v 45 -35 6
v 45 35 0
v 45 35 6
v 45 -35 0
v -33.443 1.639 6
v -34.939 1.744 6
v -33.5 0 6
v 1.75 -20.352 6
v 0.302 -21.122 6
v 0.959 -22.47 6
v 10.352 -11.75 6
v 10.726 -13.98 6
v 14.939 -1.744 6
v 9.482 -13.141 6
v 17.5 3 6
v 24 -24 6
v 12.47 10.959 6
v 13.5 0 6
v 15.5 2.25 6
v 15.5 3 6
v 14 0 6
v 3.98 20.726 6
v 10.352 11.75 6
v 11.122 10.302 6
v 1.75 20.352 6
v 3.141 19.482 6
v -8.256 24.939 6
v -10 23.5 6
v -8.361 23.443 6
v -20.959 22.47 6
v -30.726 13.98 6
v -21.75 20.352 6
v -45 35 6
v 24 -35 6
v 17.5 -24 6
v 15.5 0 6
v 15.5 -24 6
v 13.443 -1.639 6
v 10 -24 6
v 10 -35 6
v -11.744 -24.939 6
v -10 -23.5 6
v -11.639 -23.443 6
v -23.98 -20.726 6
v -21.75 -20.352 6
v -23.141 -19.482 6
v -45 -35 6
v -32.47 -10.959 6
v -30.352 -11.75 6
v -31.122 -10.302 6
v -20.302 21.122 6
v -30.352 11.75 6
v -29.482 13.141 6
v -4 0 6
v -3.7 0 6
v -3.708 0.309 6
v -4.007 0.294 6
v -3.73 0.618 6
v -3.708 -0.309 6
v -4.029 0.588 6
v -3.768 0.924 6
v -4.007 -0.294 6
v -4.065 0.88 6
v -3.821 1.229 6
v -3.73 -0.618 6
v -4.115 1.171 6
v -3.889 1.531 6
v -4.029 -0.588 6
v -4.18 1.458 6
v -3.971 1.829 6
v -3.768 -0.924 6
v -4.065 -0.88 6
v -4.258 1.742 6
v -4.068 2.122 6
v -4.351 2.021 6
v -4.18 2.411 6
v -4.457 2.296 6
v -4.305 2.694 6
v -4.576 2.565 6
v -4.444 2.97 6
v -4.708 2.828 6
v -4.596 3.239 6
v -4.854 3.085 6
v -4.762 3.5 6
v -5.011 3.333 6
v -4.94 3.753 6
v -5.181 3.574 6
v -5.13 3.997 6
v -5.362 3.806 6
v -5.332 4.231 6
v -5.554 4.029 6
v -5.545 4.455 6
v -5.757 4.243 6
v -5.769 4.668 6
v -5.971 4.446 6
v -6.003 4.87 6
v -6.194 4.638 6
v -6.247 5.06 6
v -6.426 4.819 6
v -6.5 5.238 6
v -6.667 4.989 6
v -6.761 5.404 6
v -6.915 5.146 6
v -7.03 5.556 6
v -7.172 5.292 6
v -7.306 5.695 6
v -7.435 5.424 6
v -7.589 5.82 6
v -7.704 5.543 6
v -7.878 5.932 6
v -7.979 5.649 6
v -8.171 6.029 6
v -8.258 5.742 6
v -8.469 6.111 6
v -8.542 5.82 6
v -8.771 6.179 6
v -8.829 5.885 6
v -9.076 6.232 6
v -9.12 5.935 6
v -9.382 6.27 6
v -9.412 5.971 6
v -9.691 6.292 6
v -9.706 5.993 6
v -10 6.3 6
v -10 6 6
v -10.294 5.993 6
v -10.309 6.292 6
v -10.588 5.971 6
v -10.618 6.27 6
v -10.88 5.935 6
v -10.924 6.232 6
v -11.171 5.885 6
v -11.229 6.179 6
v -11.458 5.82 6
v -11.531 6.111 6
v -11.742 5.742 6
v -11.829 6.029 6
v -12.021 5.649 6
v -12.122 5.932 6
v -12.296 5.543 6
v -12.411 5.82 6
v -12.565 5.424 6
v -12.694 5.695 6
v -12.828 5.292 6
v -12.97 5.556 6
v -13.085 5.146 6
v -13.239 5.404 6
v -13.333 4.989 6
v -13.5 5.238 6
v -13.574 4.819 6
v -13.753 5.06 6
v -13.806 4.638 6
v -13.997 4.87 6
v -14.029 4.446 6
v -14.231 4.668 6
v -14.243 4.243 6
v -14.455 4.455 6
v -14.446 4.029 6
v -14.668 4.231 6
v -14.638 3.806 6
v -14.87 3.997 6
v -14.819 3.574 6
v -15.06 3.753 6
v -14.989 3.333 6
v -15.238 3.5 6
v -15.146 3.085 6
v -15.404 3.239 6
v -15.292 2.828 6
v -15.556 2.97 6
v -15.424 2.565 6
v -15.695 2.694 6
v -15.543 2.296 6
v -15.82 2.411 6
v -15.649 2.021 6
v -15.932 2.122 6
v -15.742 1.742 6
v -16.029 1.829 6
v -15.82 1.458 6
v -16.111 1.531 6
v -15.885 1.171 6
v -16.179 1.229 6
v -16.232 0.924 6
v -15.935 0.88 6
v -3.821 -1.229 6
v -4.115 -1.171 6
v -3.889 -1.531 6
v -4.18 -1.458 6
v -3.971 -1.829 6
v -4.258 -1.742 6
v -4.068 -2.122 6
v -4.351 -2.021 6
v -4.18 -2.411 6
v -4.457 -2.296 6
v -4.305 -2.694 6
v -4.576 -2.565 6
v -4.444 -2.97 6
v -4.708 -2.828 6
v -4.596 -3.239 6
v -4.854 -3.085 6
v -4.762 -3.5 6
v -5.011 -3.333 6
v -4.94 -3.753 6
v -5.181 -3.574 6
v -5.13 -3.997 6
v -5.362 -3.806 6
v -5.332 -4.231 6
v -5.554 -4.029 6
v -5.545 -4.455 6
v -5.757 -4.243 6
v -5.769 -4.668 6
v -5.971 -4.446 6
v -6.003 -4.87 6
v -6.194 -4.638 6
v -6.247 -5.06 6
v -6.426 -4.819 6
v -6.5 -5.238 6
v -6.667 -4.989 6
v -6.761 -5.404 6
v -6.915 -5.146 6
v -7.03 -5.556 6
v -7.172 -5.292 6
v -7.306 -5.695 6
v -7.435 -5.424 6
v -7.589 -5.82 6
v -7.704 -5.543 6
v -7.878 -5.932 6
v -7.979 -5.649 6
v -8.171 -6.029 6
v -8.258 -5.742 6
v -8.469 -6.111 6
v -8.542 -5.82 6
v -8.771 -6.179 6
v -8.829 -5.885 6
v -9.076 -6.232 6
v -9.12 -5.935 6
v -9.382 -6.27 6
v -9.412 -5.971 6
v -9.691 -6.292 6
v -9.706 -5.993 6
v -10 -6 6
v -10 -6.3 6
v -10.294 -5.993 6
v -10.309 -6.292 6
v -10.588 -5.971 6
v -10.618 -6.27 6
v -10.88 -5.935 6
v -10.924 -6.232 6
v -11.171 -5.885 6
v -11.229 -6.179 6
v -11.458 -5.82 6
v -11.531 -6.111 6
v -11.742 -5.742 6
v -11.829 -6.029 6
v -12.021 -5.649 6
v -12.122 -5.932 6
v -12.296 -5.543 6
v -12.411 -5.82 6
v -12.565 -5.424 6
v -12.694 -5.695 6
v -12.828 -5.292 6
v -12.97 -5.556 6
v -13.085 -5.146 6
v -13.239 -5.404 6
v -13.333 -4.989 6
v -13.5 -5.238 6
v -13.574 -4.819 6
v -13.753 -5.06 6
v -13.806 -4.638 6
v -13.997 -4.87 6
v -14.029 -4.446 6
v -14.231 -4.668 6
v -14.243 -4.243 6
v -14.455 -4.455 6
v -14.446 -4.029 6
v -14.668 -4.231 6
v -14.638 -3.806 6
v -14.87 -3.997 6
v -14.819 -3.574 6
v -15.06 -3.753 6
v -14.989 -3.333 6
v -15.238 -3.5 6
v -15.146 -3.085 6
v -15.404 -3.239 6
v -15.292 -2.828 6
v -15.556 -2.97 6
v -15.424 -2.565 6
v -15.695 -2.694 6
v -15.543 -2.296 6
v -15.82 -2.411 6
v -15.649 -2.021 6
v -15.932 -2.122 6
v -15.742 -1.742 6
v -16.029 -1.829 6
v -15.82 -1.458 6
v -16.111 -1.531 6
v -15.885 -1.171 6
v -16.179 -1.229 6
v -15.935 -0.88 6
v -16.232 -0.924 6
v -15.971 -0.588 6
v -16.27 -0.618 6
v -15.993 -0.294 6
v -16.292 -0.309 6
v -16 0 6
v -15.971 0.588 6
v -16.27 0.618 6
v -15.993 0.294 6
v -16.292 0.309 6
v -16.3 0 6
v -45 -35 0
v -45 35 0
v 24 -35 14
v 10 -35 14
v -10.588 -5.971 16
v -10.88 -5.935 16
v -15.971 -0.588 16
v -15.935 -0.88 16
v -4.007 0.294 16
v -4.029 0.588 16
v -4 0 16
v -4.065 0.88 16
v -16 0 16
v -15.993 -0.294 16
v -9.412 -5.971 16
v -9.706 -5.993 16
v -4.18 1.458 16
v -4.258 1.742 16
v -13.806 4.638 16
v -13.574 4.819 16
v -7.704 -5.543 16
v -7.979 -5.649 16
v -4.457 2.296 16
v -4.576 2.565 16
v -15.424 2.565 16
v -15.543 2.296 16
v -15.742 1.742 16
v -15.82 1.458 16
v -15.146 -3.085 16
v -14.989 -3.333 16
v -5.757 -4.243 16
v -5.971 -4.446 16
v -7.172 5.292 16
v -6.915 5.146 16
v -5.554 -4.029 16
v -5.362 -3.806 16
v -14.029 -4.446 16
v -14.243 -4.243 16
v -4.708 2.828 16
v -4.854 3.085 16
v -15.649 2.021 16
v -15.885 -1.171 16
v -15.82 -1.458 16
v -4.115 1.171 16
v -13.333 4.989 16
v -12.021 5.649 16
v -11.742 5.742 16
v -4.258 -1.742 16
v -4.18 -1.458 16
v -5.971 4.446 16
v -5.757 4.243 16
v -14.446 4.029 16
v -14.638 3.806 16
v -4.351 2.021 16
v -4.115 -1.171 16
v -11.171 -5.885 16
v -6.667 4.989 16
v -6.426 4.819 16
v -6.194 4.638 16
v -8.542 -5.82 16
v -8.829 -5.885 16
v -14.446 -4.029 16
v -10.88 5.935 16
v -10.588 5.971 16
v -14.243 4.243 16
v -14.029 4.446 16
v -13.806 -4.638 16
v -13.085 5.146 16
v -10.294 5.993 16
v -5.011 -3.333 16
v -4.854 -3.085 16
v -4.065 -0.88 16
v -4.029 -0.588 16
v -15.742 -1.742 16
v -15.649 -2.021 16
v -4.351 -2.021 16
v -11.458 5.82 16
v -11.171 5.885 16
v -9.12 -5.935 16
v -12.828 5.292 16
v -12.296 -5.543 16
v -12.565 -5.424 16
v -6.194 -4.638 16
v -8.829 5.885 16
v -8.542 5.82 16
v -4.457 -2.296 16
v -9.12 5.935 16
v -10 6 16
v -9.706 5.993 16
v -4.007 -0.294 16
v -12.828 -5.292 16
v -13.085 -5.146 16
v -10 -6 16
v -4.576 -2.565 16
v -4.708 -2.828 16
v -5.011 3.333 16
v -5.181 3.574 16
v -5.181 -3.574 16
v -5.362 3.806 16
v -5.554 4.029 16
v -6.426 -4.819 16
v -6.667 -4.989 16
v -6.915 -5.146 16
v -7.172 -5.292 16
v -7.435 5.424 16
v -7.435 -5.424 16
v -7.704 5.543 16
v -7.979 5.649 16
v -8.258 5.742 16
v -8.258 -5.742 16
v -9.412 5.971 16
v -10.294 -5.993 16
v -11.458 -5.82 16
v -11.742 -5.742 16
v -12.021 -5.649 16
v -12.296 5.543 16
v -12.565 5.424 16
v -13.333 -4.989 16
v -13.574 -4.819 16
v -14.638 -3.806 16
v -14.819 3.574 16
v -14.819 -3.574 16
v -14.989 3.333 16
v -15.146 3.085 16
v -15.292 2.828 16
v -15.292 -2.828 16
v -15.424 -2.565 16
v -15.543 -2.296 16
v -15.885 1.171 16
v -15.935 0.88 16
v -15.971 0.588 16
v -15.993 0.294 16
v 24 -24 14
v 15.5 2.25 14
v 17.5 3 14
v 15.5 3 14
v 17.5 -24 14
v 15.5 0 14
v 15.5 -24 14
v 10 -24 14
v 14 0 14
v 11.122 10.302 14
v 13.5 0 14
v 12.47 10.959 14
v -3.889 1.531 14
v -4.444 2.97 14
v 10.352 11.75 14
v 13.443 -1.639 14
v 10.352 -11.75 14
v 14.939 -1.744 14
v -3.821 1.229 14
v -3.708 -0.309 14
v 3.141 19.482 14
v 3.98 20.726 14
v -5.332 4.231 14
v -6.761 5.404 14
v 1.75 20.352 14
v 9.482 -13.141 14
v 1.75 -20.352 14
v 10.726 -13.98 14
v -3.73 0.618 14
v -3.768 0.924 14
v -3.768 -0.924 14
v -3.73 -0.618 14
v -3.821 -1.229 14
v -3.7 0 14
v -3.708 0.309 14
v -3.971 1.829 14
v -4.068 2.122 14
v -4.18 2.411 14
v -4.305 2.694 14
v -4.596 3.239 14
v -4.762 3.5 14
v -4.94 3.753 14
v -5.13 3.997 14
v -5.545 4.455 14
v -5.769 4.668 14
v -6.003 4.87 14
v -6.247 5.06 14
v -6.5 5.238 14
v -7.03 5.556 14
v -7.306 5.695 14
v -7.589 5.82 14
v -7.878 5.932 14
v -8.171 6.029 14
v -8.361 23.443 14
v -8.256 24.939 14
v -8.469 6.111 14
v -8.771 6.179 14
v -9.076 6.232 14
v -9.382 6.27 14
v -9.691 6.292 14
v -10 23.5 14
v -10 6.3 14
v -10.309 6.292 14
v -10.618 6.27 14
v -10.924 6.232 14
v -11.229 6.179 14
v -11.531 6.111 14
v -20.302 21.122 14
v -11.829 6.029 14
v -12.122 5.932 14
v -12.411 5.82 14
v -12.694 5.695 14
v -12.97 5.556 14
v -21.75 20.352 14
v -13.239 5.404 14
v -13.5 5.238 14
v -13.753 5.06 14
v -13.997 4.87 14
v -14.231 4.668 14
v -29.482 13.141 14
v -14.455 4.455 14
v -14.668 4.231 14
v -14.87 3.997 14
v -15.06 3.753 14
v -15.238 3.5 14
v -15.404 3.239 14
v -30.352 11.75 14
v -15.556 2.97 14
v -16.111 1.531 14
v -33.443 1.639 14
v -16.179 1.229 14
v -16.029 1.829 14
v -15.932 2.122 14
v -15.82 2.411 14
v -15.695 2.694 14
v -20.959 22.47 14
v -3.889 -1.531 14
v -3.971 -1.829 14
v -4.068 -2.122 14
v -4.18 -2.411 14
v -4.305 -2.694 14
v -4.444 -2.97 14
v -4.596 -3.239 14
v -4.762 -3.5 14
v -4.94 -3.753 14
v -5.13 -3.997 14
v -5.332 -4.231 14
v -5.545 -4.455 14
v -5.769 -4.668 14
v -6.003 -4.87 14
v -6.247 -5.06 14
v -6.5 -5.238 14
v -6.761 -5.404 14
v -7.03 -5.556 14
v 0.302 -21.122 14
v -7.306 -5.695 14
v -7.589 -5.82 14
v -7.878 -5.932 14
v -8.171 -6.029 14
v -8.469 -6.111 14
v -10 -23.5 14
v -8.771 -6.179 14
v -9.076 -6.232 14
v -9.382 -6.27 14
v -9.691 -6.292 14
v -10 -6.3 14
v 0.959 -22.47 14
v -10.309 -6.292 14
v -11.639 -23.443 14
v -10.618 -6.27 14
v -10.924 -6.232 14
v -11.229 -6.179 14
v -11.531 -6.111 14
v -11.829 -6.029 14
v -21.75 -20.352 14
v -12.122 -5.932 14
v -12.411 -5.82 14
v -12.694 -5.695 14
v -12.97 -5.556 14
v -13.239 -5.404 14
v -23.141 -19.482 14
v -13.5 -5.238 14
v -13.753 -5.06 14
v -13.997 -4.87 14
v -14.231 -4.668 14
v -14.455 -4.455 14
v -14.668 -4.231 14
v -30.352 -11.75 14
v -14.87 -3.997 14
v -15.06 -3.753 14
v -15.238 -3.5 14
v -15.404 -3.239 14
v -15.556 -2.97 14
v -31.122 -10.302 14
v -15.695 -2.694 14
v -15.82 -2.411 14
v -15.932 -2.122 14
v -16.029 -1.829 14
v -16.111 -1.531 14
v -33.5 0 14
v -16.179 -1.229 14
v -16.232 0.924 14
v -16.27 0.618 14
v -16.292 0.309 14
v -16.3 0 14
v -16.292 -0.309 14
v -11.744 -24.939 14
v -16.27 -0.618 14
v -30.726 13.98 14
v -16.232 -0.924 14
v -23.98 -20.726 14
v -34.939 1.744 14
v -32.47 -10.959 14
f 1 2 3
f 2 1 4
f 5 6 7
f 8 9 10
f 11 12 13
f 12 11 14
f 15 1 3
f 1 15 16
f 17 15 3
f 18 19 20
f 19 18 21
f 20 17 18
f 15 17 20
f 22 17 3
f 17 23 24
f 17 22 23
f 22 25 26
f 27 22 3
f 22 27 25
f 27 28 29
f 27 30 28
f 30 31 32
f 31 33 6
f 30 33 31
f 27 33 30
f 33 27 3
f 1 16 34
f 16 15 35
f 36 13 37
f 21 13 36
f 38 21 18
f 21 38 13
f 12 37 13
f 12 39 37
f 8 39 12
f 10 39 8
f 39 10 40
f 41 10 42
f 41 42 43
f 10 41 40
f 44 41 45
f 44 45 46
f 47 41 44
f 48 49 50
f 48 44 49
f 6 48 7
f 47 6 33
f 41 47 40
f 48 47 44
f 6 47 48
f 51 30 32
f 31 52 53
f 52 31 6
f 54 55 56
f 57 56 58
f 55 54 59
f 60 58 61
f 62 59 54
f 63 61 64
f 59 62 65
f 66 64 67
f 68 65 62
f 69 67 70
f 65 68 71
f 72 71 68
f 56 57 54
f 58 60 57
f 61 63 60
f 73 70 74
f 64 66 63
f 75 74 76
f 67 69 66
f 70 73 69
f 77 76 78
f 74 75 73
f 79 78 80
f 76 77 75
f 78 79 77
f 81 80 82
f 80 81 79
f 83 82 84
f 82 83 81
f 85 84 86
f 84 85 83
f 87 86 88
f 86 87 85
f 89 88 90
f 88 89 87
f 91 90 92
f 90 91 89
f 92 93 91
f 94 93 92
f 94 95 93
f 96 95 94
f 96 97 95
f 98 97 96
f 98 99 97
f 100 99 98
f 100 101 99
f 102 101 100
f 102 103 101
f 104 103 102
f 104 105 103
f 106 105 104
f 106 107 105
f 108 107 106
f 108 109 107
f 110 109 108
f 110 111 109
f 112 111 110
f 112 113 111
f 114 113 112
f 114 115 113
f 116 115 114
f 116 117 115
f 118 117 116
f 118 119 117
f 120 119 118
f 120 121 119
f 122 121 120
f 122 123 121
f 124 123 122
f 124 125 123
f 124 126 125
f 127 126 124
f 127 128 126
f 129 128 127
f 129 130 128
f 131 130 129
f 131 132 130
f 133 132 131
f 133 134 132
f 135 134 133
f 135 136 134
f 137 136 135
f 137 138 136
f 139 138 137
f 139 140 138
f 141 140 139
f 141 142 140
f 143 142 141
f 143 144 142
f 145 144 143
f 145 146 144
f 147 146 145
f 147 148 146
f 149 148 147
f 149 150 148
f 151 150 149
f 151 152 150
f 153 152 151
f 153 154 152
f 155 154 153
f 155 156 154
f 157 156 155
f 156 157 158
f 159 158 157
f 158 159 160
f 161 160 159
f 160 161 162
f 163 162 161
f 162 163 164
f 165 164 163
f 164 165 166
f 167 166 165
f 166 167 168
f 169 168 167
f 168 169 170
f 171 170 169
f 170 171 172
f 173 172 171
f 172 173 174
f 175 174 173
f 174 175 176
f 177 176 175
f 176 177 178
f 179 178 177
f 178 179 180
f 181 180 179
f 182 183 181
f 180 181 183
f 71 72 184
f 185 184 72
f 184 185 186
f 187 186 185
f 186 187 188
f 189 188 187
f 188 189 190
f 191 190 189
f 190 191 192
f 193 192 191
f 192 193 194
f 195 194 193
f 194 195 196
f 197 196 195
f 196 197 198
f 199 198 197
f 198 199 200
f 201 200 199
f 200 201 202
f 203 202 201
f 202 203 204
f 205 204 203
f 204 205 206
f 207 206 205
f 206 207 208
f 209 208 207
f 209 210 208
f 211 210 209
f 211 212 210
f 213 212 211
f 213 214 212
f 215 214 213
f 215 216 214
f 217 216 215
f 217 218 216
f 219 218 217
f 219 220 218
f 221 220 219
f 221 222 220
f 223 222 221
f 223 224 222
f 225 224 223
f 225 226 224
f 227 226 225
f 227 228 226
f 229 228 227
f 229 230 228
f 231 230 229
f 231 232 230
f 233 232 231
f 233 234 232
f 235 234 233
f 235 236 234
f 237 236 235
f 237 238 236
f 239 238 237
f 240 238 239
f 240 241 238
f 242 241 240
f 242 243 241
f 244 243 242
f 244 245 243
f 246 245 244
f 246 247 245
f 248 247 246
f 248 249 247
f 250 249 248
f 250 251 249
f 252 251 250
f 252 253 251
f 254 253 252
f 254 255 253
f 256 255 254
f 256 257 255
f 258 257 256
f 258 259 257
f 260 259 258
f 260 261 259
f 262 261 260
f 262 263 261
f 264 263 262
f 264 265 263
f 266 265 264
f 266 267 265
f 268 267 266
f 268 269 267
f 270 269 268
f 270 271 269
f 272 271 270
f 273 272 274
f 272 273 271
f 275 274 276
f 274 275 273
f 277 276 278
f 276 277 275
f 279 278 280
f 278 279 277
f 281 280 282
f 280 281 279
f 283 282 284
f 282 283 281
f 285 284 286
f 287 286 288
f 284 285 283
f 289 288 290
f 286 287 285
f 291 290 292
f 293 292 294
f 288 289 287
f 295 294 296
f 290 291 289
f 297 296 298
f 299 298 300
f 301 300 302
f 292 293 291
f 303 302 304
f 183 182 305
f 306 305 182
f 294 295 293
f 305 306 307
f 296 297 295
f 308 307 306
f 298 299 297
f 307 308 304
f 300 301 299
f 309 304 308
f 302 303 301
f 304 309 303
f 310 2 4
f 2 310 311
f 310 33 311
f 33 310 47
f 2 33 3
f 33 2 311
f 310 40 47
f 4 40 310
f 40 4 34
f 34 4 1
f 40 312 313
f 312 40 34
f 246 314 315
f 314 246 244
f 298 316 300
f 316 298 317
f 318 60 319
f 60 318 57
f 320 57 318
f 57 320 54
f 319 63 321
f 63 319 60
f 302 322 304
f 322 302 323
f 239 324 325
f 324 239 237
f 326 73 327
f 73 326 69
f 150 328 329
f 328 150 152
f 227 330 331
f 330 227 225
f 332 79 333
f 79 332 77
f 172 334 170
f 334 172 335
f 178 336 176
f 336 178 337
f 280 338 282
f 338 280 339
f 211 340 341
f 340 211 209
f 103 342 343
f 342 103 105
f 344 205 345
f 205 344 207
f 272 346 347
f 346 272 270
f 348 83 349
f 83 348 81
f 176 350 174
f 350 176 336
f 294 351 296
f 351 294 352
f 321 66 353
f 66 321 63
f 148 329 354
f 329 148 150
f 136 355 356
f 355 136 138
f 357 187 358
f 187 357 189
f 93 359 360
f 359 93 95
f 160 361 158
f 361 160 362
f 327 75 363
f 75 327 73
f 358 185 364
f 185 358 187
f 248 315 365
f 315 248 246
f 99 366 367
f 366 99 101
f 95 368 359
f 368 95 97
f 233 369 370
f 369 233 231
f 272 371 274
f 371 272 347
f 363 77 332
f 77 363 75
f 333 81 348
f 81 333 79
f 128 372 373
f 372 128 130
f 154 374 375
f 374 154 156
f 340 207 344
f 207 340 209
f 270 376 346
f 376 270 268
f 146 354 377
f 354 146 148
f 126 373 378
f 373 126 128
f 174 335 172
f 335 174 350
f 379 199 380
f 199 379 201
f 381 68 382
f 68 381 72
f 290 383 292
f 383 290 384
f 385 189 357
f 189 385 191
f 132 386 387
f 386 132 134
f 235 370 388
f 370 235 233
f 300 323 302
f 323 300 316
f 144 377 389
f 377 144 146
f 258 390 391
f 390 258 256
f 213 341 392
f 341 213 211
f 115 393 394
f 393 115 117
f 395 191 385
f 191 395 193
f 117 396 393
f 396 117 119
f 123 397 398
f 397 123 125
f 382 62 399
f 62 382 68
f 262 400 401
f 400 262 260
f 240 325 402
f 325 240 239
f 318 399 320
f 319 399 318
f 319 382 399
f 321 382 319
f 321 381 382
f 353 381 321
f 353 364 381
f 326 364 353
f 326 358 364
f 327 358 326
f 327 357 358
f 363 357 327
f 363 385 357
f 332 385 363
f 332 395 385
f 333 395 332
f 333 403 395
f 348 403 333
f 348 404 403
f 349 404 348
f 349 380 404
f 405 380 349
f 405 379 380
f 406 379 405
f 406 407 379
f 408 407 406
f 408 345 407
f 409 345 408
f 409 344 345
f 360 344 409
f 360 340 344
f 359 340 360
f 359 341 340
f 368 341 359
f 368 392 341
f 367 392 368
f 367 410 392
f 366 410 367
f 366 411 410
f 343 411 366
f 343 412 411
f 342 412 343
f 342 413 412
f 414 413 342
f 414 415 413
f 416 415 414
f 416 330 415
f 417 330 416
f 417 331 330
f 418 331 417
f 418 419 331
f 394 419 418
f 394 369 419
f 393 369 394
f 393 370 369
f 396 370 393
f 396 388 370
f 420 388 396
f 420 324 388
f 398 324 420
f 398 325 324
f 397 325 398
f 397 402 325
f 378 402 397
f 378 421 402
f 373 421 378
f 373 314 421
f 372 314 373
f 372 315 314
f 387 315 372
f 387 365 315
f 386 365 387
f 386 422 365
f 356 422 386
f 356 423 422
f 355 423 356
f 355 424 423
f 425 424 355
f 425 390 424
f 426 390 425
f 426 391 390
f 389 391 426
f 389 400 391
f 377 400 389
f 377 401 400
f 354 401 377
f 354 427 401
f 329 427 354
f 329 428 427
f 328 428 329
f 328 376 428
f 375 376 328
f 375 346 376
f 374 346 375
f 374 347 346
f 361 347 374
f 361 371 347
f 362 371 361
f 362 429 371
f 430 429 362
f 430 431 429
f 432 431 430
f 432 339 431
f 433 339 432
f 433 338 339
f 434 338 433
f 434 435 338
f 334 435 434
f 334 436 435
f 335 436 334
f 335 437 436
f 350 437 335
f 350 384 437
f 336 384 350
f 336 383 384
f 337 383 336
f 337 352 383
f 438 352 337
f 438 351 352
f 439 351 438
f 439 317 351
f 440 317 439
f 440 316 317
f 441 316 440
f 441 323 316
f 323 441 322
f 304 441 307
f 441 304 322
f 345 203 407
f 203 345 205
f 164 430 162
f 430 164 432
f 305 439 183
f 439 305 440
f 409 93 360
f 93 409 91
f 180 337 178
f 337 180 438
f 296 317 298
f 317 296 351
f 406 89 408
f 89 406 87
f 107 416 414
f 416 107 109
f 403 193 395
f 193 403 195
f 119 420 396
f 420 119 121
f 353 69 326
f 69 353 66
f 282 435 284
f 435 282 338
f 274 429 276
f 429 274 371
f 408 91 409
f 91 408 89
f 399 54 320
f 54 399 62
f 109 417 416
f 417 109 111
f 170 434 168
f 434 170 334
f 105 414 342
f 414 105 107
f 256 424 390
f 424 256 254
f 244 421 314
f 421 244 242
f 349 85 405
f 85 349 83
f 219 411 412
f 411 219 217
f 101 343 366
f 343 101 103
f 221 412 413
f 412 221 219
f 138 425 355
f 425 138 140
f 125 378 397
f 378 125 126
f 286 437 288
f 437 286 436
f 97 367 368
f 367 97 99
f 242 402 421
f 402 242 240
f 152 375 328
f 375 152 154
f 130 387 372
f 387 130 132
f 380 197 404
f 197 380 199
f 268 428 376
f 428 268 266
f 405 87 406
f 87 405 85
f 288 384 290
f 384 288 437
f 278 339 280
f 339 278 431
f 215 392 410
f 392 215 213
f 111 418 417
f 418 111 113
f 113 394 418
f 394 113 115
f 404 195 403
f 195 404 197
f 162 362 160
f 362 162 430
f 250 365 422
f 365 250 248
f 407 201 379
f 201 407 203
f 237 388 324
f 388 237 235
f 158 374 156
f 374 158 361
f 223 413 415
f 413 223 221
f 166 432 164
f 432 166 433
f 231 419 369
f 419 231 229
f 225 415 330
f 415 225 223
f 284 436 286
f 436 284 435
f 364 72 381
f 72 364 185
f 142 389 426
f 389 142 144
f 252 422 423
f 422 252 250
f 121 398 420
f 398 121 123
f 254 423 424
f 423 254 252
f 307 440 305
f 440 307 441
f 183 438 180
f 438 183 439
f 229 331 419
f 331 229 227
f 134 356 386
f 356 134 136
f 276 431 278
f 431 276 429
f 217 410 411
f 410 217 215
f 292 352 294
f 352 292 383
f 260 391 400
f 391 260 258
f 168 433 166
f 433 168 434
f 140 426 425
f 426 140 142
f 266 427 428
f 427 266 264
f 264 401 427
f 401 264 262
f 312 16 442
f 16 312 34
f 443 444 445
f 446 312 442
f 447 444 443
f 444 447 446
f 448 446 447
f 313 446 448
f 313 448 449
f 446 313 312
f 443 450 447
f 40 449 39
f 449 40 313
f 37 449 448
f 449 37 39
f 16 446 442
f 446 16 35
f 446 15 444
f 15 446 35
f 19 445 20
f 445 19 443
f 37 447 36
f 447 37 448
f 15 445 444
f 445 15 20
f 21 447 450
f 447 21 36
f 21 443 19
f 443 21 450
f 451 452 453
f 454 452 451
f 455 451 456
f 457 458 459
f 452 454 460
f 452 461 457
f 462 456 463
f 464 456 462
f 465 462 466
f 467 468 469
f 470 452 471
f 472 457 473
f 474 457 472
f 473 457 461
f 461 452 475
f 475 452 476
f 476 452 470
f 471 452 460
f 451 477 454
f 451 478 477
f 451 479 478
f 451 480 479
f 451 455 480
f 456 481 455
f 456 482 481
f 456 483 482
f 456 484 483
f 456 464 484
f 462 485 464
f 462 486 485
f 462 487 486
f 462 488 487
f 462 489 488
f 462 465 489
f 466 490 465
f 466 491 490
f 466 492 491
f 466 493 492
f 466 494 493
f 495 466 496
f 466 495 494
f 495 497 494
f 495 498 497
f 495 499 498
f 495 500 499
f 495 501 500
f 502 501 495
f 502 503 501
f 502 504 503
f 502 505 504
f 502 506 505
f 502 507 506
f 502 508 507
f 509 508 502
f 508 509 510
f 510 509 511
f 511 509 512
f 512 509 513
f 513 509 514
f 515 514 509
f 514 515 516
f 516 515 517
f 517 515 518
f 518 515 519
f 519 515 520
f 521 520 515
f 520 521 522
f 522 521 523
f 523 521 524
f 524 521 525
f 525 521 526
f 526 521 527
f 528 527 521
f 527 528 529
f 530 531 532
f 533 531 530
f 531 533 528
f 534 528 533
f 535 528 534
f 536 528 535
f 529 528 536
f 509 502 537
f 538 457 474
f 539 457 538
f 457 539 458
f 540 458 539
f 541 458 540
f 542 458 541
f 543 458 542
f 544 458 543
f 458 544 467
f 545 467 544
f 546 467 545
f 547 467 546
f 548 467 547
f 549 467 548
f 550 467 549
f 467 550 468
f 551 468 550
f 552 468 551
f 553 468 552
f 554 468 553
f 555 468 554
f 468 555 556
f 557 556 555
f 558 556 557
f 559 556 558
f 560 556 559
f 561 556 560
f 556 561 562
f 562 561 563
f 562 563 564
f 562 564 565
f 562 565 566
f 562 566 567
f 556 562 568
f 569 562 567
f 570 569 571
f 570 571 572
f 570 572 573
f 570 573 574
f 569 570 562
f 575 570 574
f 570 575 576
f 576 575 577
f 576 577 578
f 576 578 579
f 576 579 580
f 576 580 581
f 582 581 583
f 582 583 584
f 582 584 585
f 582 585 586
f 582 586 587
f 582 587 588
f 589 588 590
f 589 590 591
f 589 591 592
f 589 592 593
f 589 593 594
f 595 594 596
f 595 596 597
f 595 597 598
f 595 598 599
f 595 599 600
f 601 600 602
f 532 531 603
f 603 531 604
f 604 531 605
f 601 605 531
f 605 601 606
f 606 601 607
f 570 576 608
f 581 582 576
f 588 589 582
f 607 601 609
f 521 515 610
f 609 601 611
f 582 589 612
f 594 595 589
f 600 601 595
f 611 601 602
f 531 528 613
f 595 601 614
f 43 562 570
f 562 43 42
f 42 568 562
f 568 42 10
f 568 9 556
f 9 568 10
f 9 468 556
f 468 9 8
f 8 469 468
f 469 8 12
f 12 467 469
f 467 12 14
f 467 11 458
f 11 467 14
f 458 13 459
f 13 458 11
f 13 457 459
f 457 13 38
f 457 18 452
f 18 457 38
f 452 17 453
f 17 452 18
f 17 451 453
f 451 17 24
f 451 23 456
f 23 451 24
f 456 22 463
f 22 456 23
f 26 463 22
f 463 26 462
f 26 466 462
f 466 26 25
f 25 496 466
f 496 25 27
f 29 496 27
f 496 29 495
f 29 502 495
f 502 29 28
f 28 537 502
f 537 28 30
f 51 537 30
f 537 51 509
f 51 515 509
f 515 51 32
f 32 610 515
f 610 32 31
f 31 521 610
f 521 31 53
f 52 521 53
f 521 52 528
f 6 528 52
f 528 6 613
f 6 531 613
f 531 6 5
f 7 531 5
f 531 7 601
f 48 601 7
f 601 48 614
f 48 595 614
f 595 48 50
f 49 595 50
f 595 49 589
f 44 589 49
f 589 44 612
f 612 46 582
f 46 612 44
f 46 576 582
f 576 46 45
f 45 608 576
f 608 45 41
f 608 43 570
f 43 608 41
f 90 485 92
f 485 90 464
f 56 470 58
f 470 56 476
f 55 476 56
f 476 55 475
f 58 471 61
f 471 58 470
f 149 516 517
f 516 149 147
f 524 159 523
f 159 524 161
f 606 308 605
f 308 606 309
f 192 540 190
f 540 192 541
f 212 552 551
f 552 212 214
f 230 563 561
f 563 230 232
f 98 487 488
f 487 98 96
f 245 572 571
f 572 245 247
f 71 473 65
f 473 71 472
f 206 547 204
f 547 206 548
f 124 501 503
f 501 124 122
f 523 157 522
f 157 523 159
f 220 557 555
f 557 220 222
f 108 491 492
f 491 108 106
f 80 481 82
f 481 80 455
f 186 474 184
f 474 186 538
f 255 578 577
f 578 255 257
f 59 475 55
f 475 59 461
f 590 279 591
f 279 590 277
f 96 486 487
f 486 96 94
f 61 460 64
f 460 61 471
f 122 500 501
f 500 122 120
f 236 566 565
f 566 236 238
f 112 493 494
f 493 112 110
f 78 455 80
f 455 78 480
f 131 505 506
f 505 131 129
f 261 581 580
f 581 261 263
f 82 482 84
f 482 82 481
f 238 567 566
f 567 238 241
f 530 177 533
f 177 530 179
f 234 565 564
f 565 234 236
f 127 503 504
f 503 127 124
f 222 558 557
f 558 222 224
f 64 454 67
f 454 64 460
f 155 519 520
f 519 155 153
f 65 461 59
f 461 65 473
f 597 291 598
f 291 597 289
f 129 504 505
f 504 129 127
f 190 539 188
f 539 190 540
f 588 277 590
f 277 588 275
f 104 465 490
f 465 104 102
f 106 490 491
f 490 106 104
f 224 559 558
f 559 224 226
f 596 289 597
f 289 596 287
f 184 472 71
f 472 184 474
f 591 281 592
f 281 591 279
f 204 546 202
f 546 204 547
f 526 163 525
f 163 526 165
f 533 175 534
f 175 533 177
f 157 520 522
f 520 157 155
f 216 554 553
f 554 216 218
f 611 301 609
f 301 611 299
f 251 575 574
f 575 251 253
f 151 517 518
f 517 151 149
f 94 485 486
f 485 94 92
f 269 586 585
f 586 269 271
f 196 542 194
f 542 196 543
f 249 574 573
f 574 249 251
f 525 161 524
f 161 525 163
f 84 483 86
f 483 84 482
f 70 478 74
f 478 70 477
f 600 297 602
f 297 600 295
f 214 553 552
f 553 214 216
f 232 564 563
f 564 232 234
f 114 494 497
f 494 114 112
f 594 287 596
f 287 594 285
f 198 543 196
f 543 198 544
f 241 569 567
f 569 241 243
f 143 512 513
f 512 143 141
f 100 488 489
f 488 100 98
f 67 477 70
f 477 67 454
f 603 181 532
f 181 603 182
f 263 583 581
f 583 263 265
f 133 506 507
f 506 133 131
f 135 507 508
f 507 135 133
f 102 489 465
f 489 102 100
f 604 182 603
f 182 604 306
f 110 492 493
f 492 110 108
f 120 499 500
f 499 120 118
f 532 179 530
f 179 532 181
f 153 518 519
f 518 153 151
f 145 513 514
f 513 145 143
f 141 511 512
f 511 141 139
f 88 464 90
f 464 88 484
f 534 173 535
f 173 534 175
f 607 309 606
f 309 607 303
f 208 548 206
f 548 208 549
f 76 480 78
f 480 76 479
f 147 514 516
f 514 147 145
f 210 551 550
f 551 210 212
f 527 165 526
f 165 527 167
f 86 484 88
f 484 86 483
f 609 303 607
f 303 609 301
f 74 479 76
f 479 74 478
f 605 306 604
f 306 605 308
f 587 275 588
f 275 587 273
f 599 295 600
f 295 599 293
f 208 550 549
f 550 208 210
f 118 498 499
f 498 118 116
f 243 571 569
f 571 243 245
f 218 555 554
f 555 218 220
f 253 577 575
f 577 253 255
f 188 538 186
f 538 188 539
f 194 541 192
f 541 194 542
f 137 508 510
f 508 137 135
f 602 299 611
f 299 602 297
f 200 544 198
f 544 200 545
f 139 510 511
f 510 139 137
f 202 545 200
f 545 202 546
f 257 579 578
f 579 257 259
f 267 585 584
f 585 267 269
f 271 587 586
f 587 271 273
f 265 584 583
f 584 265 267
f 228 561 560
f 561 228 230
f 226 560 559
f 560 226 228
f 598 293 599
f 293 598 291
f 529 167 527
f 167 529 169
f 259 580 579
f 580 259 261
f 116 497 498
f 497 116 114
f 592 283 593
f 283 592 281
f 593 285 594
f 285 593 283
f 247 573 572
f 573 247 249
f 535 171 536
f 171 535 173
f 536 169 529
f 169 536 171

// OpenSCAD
/* Ratchet wheel with spring pawl - PLA, 0.4 nozzle, no supports */
// Wheel ~50mm dia, 12 teeth. Free clockwise (from above), locks CCW.
// Print orientation: both parts flat, +Z up, bottom on bed.

/* [Part] */
part = "assembly"; // [wheel, base, assembly]
cadverify_only = "";
module instance(name, part, unit = 1) {
    echo(cadverify_instance = [name, part, unit]);
    if (cadverify_only == "" || cadverify_only == name) children();
}

// ---- parameters (mm) ----
Ro = 25;            // wheel tip radius (dia 50)
Rr = 23.5;          // wheel root radius (tooth height 1.5)
Nteeth = 12;
pitch = 360/Nteeth; // 30
gentle_span = 26;   // valley->tip CCW (gentle ramp)
wheel_t = 8;        // wheel thickness
bore_d = 12.6;      // wheel bore
post_d = 12;        // post diameter
post_h = 10;        // post height above base top
base_x = 90;
base_y = 70;
base_t = 6;
wheel_cx = -10;     // post/wheel centre in base coords
wheel_cy = 0;
base_top = base_t;  // 6
// pawl / arm
beam_x0 = 15.5; beam_x1 = 17.5;   // beam 2mm thick in X
beam_y0 = -30; beam_y1 = 3;       // beam length
beam_z0 = 6; beam_z1 = 14;        // beam height 8
tip_x = 14.0;       // pawl tip westmost (1.0 inside tip circle: 25-24=1.0)

$fn = 128;

// ---- wheel: centred at (0,0), bottom z=0 ----
module wheel() {
    difference() {
        linear_extrude(height = wheel_t, convexity = 4)
            polygon(points = [ for (i = [0:Nteeth-1]) each [
                [Rr*cos(i*pitch), Rr*sin(i*pitch)],
                [Ro*cos(i*pitch+gentle_span), Ro*sin(i*pitch+gentle_span)],
                [Rr*cos(i*pitch+gentle_span), Rr*sin(i*pitch+gentle_span)]
            ]]);
        translate([0,0,-1]) cylinder(d = bore_d, h = wheel_t+2);
    }
}

// ---- base: plate centred at origin, bottom z=0, post at (wheel_cx,wheel_cy) ----
module base() {
    union() {
        // plate
        translate([-base_x/2, -base_y/2, 0]) cube([base_x, base_y, base_t]);
        // post
        translate([wheel_cx, wheel_cy, base_top]) cylinder(d = post_d, h = post_h);
        // anchor block
        translate([10, -35, 6]) cube([14, 11, 8]);
        // flexible beam (2mm thick, ~33mm long, 8mm tall)
        translate([beam_x0, beam_y0, beam_z0]) cube([beam_x1-beam_x0, beam_y1-beam_y0, beam_z1-beam_z0]);
        // pawl tip wedge: tip (tip_x,0), overlap 0.5 into beam; north ramp, south flat
        linear_extrude(height = 8, convexity = 2)
            polygon(points = [[tip_x,0],[16,0],[16,3]]);
        // shift pawl wedge up to beam height (extrude from 0 -> translate)
    }
}

// pawl wedge is extruded 0..8, need to lift to 6..14: wrap
module base_fixed() {
    union() {
        translate([-base_x/2, -base_y/2, 0]) cube([base_x, base_y, base_t]);
        translate([wheel_cx, wheel_cy, base_top]) cylinder(d = post_d, h = post_h);
        translate([10, -35, 6]) cube([14, 11, 8]);
        translate([beam_x0, beam_y0, beam_z0]) cube([beam_x1-beam_x0, beam_y1-beam_y0, beam_z1-beam_z0]);
        translate([0,0,6]) linear_extrude(height = 8, convexity = 2)
            polygon(points = [[tip_x,0],[16,0],[16,3]]);
    }
}

// ---- specs ----
if (part == "wheel") echo(cadverify_spec = [
    ["bounds", [[-Ro, -Ro, 0], [Ro, Ro, wheel_t]]],
    ["bodies", 1],
    ["through_holes", 1],
    ["support_faces", [["bed", "-z", 1000]]],
    ["overhangs_allowed", []],
    ["copies", 1],
    ["details", [
        ["bore", "hole", [0, 0, 10], [0, 0, -1], [[0, bore_d], [wheel_t-0.5, bore_d]]],
        ["rim", "thickness", [0, 15, 10], [0, 0, -1], wheel_t],
        ["tooth", "material", [[20.5, 5.5, 0], [22.5, 8.5, wheel_t]], 0.5],
        ["teeth", "view", [[20, -25, 0], [Ro, 25, wheel_t]]]
    ]]
]);

if (part == "base") echo(cadverify_spec = [
    ["bounds", [[-base_x/2, -base_y/2, 0], [base_x/2, base_y/2, base_top+post_h]]],
    ["bodies", 1],
    ["support_faces", [["bed", "-z", 4000]]],
    ["overhangs_allowed", []],
    ["copies", 1],
    ["details", [
        ["plate", "thickness", [-30, 20, 10], [0, 0, -1], base_t],
        ["post", "material", [[wheel_cx-6, wheel_cy-6, base_top], [wheel_cx+6, wheel_cy+6, base_top+post_h]], 0.5],
        ["arm", "material", [[beam_x0, beam_y0, beam_z0], [beam_x1, beam_y1, beam_z1]], 0.9],
        ["pawl_tip", "view", [[14.0, -1, 6], [16, 3.5, 14]]]
    ]]
]);

if (part == "assembly") echo(cadverify_spec = [
    ["bounds", [[-base_x/2, -base_y/2, 0], [base_x/2, base_y/2, base_top+post_h]]],
    ["motions", [
        ["click", ["wheel1"], "rotate", [wheel_cx, wheel_cy, base_top], [0, 0, 1], [0, -360],
            ["flex", [["wheel1", "base1", 1.0, "pawl flexes over teeth"]]]]
    ]],
    ["assembly_order", [
        [["base1"], [0, 0, 0]],
        [["wheel1"], [0, 0, -30], ["flex", [["wheel1", "base1", 1.0, "pawl snaps aside as rim passes"]]]]
    ]]
]);

// ---- geometry dispatch ----
if (part == "wheel") wheel();
else if (part == "base") base_fixed();
else if (part == "assembly") {
    instance("base1", "base") base_fixed();
    instance("wheel1", "wheel") translate([wheel_cx, wheel_cy, base_top]) wheel();
}
